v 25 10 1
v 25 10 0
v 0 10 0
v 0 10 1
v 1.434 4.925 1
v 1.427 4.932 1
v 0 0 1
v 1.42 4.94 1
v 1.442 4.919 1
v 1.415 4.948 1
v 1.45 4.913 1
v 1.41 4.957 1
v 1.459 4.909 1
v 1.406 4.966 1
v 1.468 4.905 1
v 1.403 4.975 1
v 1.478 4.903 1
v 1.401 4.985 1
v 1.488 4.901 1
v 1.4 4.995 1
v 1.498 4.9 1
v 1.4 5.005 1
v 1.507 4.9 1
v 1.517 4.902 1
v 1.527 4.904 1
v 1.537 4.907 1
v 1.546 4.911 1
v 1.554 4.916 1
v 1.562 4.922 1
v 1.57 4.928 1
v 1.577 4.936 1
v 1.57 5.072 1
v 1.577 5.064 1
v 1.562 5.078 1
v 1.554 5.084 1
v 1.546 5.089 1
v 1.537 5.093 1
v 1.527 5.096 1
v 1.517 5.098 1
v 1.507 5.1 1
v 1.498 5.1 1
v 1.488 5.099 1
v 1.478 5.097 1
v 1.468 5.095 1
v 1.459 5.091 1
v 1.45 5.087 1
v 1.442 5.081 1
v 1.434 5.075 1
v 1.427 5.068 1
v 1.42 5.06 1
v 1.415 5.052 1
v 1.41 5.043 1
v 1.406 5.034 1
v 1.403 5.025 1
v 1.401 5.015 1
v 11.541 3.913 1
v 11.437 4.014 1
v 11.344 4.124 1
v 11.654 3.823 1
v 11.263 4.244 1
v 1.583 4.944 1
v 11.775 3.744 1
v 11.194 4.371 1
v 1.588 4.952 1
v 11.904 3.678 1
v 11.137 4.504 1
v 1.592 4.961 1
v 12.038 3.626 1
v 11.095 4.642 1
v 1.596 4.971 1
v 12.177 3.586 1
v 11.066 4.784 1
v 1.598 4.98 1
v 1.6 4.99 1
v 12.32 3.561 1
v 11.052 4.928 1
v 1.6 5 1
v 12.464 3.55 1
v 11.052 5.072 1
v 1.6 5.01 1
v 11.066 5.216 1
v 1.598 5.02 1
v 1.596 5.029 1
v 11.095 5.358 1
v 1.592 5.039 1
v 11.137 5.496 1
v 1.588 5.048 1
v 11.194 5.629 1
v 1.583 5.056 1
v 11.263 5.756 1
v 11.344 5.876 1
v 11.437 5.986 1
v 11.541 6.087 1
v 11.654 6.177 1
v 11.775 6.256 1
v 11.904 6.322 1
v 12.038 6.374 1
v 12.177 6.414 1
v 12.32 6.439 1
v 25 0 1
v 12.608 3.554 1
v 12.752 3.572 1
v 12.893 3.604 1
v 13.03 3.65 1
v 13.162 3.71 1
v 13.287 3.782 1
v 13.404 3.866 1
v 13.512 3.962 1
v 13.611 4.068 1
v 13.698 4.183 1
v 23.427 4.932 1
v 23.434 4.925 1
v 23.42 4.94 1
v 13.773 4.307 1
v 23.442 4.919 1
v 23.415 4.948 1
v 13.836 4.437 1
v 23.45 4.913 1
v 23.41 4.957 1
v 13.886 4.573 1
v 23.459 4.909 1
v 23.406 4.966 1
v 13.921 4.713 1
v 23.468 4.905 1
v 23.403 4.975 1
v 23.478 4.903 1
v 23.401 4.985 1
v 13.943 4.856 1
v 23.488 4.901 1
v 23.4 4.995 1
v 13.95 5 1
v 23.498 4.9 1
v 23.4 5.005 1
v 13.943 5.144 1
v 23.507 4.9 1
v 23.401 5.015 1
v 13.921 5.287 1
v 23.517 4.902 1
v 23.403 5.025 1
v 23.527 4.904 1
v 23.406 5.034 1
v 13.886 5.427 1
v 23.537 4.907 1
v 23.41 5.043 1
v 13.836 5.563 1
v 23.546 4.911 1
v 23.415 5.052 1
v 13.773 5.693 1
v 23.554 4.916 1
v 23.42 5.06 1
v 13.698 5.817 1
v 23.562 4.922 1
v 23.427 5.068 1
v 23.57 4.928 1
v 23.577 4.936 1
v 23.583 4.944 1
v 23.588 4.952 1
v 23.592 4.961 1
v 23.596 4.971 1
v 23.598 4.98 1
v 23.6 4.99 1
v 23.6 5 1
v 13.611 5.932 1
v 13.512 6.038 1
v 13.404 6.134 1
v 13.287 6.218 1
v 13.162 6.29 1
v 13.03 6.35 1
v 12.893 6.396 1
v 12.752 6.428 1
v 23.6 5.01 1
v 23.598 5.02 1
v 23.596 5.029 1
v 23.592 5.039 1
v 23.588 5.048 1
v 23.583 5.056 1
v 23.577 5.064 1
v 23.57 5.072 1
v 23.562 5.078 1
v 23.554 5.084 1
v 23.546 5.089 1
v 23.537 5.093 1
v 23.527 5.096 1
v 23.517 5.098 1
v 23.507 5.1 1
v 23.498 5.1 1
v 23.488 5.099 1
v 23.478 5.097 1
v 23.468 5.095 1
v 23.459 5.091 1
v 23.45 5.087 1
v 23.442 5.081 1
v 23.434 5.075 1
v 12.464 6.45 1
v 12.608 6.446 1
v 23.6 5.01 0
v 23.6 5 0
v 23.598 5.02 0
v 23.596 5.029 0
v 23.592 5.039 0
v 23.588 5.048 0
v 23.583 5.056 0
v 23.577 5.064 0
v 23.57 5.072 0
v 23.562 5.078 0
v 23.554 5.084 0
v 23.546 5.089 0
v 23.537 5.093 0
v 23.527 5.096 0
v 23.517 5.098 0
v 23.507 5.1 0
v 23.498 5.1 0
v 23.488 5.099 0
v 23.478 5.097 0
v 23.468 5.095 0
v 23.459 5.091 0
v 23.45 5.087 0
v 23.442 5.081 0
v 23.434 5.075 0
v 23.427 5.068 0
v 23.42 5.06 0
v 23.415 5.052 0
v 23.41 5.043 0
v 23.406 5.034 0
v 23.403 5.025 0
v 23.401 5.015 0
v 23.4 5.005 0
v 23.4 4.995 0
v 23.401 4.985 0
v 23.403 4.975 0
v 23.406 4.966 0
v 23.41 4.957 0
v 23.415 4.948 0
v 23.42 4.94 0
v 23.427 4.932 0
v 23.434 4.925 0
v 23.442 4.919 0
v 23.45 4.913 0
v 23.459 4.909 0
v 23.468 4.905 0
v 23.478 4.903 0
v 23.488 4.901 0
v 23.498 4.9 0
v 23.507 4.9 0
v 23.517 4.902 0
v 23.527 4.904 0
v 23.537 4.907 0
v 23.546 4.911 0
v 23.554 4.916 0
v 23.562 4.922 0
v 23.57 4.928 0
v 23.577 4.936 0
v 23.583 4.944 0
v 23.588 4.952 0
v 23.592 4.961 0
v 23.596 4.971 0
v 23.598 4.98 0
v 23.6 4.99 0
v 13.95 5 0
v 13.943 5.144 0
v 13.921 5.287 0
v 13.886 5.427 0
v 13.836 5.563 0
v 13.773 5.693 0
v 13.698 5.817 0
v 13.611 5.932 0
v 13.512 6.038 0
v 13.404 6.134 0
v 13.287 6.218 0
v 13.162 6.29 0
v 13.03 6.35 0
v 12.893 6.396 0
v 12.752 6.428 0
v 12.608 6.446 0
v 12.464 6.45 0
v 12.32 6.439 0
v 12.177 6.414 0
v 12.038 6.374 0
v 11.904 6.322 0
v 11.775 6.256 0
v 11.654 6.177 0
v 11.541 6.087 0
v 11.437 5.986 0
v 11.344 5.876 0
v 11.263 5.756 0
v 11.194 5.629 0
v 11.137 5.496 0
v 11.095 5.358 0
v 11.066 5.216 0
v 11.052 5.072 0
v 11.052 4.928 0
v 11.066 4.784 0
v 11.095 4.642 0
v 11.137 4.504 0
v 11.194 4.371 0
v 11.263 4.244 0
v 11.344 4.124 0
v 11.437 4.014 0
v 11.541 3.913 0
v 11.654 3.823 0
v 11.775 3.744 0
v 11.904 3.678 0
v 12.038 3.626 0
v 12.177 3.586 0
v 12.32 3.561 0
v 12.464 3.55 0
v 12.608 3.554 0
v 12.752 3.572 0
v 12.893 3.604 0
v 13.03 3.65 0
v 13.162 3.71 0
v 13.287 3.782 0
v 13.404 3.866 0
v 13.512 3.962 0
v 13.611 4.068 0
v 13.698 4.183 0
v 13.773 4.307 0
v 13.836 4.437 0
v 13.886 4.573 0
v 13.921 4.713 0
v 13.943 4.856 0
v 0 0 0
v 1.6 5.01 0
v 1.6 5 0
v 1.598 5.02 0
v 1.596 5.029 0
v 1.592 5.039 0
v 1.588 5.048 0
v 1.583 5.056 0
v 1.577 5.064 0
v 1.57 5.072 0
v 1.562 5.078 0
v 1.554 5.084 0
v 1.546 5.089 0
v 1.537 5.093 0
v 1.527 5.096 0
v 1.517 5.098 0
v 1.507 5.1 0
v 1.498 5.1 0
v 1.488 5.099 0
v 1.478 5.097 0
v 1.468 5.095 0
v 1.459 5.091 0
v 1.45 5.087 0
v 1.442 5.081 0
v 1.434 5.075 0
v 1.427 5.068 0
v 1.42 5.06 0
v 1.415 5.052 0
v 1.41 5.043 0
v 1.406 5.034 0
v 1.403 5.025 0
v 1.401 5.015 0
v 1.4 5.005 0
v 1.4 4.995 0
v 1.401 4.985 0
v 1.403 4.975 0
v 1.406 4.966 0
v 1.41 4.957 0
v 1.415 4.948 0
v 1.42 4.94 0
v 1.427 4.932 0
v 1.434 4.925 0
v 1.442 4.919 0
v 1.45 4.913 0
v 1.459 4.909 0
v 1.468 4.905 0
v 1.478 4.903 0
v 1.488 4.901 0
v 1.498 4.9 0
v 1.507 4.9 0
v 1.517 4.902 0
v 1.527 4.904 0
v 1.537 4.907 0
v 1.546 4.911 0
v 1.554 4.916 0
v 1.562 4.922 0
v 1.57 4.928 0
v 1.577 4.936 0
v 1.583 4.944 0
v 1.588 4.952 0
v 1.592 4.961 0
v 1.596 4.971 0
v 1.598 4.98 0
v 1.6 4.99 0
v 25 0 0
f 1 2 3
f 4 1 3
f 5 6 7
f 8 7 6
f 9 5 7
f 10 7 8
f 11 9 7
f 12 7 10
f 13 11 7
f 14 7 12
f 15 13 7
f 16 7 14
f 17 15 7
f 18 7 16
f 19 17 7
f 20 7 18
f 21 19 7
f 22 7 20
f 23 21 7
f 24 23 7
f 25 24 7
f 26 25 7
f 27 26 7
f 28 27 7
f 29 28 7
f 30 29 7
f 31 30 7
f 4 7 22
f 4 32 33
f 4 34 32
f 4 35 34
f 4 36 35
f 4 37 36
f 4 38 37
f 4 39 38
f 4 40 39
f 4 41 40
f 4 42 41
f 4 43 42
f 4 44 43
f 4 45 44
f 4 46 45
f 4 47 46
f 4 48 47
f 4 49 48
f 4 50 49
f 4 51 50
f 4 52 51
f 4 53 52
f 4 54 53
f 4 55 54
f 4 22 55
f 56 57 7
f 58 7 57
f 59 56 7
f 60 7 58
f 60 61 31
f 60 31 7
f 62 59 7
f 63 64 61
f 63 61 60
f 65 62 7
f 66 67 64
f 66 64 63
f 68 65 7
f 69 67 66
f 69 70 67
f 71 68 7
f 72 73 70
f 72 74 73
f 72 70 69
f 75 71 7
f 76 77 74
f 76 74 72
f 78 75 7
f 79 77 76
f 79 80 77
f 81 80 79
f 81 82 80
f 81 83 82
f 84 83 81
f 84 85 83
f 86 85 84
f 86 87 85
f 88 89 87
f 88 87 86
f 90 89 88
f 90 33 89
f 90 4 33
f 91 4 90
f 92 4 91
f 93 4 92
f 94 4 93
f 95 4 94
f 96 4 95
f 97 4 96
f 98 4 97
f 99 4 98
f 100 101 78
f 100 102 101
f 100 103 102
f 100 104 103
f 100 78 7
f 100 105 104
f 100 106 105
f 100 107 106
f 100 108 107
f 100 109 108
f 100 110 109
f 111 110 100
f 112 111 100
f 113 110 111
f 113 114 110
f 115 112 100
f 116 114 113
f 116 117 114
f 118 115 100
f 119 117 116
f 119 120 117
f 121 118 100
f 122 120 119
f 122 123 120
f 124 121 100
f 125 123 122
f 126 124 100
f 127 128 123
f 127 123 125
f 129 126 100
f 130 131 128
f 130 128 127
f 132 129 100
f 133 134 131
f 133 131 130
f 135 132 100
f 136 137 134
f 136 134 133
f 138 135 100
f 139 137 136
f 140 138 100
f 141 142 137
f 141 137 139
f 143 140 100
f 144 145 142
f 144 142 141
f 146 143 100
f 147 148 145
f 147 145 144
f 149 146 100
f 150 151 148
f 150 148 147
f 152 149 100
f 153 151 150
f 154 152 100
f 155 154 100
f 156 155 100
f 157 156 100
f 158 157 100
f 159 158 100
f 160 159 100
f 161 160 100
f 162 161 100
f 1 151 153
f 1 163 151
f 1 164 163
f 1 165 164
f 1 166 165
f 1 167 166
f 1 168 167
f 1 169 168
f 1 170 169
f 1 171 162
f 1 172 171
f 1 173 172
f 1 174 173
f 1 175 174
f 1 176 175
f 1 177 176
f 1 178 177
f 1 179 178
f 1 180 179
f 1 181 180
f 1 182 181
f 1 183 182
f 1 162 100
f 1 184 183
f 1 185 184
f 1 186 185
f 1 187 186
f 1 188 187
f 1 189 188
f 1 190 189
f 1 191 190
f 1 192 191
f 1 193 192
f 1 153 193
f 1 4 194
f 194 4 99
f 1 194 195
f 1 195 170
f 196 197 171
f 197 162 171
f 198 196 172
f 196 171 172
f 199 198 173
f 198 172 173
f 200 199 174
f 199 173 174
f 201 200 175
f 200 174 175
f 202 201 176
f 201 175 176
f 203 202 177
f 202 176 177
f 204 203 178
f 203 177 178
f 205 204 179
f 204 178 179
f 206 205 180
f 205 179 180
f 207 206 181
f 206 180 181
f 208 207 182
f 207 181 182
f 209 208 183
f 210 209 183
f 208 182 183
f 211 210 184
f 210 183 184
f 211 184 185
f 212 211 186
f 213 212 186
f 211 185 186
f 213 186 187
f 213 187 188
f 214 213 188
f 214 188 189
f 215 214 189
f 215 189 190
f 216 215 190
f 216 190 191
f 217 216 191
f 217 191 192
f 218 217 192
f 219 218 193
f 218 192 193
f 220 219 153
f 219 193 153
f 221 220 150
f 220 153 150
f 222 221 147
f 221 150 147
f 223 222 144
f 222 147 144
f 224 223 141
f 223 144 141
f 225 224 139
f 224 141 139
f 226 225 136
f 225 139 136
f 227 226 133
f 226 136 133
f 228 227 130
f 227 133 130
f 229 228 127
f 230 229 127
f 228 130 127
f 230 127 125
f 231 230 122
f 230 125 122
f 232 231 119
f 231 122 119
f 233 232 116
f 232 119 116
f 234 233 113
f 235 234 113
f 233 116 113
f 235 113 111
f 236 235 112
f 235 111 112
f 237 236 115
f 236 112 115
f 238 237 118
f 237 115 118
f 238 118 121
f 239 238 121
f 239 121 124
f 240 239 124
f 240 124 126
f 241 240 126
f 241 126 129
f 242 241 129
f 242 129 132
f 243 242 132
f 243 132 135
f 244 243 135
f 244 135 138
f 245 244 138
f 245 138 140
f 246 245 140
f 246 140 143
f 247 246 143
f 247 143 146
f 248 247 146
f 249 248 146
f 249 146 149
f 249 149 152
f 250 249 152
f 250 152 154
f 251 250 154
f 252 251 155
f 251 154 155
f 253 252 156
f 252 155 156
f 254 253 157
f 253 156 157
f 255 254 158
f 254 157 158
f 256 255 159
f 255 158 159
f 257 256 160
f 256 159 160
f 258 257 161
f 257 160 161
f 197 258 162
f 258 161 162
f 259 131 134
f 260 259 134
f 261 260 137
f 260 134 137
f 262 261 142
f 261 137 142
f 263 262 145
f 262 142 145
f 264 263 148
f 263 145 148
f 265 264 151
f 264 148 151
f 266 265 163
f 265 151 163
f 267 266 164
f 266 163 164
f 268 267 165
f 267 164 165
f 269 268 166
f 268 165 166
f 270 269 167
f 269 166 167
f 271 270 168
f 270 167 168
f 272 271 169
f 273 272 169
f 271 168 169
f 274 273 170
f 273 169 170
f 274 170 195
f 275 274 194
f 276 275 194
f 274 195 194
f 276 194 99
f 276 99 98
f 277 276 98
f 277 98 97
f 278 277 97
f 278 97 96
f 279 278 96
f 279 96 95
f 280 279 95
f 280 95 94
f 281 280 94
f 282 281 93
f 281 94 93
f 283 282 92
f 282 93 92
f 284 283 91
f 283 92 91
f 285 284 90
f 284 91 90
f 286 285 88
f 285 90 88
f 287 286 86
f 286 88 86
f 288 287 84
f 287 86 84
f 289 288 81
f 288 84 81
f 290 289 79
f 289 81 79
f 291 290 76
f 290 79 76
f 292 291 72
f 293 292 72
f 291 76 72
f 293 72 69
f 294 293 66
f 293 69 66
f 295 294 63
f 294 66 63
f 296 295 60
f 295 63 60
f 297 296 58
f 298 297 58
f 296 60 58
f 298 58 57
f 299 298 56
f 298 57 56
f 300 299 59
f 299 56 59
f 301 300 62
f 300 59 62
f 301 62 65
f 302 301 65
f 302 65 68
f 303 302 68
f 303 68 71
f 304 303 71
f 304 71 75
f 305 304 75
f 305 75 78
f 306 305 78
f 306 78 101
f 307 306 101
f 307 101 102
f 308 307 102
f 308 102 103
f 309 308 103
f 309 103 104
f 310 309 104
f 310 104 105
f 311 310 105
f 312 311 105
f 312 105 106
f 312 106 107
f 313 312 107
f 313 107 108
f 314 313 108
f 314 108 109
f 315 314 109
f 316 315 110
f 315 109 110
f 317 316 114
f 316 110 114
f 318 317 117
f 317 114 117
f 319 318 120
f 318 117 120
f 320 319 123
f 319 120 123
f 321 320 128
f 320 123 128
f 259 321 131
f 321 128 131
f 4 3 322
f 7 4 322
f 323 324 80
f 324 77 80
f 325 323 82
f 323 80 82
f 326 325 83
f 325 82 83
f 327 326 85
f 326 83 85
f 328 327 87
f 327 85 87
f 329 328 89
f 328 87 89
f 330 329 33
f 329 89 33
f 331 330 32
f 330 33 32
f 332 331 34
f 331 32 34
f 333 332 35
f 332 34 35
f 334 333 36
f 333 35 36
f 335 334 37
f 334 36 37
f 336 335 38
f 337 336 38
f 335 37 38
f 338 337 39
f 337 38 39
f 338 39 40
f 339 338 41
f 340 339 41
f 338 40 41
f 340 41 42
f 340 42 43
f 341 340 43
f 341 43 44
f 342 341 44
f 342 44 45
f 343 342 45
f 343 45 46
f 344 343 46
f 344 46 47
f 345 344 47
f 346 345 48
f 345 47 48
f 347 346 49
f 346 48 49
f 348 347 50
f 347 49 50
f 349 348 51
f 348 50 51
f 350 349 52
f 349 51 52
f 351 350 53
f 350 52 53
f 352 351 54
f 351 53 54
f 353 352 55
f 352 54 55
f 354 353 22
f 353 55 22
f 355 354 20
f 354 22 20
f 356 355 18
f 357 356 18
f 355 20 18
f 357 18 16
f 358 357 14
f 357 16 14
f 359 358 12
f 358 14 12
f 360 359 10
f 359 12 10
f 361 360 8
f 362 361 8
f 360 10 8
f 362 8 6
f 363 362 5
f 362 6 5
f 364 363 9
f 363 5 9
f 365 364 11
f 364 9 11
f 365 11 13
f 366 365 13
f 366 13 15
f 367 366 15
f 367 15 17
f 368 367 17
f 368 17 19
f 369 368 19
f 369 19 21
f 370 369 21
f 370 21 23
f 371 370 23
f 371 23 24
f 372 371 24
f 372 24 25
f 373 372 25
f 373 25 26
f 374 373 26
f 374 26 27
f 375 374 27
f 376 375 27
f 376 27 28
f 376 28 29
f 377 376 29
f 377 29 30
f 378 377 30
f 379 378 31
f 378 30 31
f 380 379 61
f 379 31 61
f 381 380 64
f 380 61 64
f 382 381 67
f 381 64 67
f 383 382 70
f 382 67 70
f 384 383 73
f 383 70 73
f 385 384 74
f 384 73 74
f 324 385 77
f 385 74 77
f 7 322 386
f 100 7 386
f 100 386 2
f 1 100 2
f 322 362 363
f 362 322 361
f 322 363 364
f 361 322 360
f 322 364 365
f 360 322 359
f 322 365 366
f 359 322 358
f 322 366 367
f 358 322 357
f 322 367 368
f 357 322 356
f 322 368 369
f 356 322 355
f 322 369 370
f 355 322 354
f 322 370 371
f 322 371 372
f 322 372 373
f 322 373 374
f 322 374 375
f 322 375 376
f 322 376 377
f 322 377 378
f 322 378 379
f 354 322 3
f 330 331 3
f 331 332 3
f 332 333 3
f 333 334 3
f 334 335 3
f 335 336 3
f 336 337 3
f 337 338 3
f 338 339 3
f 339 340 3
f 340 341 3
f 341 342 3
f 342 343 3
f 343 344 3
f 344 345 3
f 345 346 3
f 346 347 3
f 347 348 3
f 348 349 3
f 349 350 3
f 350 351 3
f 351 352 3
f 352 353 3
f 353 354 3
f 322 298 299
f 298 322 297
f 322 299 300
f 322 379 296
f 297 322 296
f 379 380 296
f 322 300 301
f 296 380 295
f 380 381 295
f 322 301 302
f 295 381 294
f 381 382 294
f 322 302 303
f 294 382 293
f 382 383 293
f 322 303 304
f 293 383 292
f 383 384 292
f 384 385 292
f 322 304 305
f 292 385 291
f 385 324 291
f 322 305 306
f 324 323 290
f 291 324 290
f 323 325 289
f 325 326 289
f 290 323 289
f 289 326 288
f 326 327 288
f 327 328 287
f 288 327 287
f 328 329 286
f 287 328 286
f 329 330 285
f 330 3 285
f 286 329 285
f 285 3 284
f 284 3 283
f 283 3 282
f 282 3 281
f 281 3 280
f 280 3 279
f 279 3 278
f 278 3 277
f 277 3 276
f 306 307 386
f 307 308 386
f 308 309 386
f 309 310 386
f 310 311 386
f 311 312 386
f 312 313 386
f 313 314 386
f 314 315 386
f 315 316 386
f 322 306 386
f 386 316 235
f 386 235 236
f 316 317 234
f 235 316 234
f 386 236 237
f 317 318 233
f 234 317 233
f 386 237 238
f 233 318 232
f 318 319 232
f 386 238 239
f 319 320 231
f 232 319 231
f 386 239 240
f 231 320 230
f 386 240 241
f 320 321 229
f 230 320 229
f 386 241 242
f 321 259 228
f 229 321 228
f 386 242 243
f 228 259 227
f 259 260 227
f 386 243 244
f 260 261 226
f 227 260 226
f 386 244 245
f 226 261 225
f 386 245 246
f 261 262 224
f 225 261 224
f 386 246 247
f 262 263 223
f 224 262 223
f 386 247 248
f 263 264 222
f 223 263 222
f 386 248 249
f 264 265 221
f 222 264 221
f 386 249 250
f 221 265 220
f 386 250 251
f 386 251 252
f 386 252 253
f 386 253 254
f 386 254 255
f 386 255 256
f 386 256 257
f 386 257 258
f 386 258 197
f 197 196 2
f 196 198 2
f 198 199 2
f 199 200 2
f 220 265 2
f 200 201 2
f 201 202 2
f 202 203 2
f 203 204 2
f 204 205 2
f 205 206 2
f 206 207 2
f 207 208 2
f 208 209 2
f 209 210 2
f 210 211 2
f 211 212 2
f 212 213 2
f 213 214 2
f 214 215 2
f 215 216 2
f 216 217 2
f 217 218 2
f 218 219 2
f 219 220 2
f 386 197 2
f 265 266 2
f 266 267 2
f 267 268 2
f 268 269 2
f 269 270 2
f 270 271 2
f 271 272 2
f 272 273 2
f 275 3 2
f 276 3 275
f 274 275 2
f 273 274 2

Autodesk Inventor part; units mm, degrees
ref_plane "YZ Plane" through (0, 0, 0) normal (1, 0, 0) x (0, 1, 0)
ref_plane "XZ Plane" through (0, 0, 0) normal (0, 1, 0) x (-1, 0, 0)
ref_plane "XY Plane" through (0, 0, 0) normal (0, 0, 1) x (1, 0, 0)
sketch "Sketch1" plane through (0, 0, 0) normal (0, 0, 1) x (1, 0, 0)
  line L0 (0, 0) -> (25, 0)
  line L1 (25, 0) -> (25, 10)
  line L2 (25, 10) -> (0, 10)
  line L3 (0, 10) -> (0, 0)
  dimension "d0" = 25
  dimension "d1" = 10
extrude "Extrusion1" add sketch "Sketch1" along normal blind 1
sketch "Sketch2" plane through (0, 0, 1) normal (0, 0, 1) x (1, 0, 0)
  circle A0 centre (12.5, 5) radius 1.45
  line L0 (0, 0) -> (25, 0) projected
  line L1 (0, 10) -> (0, 0) projected
  line L2 (12.5, 0) -> (12.5, 2.5918) construction
  line L3 (25, 0) -> (25, 10) projected
  line L4 (25, 10) -> (0, 10) projected
  line L5 (25, 5) -> (1.9186, 5) construction
  dimension "d4" = 2.9
extrude "Extrusion2" cut sketch "Sketch2" against normal blind 15 contours A0
sketch "Sketch3" plane through (0, 0, 1) normal (0, 0, 1) x (1, 0, 0)
  line L0 (25, 0) -> (25, 10) projected
  line L1 (0, 10) -> (0, 0) projected
  circle A0 centre (23.5, 5) radius 0.1
  circle A1 centre (1.5, 5) radius 0.1
  line L2 (25, 5) -> (0, 5) construction
  dimension "d7" = 0.2
  dimension "d8" = 0.2
  dimension "d9" = 1.5
  dimension "d10" = 1.5
extrude "Extrusion3" cut sketch "Sketch3" against normal blind 15
properties part number "MaterialTest01"
